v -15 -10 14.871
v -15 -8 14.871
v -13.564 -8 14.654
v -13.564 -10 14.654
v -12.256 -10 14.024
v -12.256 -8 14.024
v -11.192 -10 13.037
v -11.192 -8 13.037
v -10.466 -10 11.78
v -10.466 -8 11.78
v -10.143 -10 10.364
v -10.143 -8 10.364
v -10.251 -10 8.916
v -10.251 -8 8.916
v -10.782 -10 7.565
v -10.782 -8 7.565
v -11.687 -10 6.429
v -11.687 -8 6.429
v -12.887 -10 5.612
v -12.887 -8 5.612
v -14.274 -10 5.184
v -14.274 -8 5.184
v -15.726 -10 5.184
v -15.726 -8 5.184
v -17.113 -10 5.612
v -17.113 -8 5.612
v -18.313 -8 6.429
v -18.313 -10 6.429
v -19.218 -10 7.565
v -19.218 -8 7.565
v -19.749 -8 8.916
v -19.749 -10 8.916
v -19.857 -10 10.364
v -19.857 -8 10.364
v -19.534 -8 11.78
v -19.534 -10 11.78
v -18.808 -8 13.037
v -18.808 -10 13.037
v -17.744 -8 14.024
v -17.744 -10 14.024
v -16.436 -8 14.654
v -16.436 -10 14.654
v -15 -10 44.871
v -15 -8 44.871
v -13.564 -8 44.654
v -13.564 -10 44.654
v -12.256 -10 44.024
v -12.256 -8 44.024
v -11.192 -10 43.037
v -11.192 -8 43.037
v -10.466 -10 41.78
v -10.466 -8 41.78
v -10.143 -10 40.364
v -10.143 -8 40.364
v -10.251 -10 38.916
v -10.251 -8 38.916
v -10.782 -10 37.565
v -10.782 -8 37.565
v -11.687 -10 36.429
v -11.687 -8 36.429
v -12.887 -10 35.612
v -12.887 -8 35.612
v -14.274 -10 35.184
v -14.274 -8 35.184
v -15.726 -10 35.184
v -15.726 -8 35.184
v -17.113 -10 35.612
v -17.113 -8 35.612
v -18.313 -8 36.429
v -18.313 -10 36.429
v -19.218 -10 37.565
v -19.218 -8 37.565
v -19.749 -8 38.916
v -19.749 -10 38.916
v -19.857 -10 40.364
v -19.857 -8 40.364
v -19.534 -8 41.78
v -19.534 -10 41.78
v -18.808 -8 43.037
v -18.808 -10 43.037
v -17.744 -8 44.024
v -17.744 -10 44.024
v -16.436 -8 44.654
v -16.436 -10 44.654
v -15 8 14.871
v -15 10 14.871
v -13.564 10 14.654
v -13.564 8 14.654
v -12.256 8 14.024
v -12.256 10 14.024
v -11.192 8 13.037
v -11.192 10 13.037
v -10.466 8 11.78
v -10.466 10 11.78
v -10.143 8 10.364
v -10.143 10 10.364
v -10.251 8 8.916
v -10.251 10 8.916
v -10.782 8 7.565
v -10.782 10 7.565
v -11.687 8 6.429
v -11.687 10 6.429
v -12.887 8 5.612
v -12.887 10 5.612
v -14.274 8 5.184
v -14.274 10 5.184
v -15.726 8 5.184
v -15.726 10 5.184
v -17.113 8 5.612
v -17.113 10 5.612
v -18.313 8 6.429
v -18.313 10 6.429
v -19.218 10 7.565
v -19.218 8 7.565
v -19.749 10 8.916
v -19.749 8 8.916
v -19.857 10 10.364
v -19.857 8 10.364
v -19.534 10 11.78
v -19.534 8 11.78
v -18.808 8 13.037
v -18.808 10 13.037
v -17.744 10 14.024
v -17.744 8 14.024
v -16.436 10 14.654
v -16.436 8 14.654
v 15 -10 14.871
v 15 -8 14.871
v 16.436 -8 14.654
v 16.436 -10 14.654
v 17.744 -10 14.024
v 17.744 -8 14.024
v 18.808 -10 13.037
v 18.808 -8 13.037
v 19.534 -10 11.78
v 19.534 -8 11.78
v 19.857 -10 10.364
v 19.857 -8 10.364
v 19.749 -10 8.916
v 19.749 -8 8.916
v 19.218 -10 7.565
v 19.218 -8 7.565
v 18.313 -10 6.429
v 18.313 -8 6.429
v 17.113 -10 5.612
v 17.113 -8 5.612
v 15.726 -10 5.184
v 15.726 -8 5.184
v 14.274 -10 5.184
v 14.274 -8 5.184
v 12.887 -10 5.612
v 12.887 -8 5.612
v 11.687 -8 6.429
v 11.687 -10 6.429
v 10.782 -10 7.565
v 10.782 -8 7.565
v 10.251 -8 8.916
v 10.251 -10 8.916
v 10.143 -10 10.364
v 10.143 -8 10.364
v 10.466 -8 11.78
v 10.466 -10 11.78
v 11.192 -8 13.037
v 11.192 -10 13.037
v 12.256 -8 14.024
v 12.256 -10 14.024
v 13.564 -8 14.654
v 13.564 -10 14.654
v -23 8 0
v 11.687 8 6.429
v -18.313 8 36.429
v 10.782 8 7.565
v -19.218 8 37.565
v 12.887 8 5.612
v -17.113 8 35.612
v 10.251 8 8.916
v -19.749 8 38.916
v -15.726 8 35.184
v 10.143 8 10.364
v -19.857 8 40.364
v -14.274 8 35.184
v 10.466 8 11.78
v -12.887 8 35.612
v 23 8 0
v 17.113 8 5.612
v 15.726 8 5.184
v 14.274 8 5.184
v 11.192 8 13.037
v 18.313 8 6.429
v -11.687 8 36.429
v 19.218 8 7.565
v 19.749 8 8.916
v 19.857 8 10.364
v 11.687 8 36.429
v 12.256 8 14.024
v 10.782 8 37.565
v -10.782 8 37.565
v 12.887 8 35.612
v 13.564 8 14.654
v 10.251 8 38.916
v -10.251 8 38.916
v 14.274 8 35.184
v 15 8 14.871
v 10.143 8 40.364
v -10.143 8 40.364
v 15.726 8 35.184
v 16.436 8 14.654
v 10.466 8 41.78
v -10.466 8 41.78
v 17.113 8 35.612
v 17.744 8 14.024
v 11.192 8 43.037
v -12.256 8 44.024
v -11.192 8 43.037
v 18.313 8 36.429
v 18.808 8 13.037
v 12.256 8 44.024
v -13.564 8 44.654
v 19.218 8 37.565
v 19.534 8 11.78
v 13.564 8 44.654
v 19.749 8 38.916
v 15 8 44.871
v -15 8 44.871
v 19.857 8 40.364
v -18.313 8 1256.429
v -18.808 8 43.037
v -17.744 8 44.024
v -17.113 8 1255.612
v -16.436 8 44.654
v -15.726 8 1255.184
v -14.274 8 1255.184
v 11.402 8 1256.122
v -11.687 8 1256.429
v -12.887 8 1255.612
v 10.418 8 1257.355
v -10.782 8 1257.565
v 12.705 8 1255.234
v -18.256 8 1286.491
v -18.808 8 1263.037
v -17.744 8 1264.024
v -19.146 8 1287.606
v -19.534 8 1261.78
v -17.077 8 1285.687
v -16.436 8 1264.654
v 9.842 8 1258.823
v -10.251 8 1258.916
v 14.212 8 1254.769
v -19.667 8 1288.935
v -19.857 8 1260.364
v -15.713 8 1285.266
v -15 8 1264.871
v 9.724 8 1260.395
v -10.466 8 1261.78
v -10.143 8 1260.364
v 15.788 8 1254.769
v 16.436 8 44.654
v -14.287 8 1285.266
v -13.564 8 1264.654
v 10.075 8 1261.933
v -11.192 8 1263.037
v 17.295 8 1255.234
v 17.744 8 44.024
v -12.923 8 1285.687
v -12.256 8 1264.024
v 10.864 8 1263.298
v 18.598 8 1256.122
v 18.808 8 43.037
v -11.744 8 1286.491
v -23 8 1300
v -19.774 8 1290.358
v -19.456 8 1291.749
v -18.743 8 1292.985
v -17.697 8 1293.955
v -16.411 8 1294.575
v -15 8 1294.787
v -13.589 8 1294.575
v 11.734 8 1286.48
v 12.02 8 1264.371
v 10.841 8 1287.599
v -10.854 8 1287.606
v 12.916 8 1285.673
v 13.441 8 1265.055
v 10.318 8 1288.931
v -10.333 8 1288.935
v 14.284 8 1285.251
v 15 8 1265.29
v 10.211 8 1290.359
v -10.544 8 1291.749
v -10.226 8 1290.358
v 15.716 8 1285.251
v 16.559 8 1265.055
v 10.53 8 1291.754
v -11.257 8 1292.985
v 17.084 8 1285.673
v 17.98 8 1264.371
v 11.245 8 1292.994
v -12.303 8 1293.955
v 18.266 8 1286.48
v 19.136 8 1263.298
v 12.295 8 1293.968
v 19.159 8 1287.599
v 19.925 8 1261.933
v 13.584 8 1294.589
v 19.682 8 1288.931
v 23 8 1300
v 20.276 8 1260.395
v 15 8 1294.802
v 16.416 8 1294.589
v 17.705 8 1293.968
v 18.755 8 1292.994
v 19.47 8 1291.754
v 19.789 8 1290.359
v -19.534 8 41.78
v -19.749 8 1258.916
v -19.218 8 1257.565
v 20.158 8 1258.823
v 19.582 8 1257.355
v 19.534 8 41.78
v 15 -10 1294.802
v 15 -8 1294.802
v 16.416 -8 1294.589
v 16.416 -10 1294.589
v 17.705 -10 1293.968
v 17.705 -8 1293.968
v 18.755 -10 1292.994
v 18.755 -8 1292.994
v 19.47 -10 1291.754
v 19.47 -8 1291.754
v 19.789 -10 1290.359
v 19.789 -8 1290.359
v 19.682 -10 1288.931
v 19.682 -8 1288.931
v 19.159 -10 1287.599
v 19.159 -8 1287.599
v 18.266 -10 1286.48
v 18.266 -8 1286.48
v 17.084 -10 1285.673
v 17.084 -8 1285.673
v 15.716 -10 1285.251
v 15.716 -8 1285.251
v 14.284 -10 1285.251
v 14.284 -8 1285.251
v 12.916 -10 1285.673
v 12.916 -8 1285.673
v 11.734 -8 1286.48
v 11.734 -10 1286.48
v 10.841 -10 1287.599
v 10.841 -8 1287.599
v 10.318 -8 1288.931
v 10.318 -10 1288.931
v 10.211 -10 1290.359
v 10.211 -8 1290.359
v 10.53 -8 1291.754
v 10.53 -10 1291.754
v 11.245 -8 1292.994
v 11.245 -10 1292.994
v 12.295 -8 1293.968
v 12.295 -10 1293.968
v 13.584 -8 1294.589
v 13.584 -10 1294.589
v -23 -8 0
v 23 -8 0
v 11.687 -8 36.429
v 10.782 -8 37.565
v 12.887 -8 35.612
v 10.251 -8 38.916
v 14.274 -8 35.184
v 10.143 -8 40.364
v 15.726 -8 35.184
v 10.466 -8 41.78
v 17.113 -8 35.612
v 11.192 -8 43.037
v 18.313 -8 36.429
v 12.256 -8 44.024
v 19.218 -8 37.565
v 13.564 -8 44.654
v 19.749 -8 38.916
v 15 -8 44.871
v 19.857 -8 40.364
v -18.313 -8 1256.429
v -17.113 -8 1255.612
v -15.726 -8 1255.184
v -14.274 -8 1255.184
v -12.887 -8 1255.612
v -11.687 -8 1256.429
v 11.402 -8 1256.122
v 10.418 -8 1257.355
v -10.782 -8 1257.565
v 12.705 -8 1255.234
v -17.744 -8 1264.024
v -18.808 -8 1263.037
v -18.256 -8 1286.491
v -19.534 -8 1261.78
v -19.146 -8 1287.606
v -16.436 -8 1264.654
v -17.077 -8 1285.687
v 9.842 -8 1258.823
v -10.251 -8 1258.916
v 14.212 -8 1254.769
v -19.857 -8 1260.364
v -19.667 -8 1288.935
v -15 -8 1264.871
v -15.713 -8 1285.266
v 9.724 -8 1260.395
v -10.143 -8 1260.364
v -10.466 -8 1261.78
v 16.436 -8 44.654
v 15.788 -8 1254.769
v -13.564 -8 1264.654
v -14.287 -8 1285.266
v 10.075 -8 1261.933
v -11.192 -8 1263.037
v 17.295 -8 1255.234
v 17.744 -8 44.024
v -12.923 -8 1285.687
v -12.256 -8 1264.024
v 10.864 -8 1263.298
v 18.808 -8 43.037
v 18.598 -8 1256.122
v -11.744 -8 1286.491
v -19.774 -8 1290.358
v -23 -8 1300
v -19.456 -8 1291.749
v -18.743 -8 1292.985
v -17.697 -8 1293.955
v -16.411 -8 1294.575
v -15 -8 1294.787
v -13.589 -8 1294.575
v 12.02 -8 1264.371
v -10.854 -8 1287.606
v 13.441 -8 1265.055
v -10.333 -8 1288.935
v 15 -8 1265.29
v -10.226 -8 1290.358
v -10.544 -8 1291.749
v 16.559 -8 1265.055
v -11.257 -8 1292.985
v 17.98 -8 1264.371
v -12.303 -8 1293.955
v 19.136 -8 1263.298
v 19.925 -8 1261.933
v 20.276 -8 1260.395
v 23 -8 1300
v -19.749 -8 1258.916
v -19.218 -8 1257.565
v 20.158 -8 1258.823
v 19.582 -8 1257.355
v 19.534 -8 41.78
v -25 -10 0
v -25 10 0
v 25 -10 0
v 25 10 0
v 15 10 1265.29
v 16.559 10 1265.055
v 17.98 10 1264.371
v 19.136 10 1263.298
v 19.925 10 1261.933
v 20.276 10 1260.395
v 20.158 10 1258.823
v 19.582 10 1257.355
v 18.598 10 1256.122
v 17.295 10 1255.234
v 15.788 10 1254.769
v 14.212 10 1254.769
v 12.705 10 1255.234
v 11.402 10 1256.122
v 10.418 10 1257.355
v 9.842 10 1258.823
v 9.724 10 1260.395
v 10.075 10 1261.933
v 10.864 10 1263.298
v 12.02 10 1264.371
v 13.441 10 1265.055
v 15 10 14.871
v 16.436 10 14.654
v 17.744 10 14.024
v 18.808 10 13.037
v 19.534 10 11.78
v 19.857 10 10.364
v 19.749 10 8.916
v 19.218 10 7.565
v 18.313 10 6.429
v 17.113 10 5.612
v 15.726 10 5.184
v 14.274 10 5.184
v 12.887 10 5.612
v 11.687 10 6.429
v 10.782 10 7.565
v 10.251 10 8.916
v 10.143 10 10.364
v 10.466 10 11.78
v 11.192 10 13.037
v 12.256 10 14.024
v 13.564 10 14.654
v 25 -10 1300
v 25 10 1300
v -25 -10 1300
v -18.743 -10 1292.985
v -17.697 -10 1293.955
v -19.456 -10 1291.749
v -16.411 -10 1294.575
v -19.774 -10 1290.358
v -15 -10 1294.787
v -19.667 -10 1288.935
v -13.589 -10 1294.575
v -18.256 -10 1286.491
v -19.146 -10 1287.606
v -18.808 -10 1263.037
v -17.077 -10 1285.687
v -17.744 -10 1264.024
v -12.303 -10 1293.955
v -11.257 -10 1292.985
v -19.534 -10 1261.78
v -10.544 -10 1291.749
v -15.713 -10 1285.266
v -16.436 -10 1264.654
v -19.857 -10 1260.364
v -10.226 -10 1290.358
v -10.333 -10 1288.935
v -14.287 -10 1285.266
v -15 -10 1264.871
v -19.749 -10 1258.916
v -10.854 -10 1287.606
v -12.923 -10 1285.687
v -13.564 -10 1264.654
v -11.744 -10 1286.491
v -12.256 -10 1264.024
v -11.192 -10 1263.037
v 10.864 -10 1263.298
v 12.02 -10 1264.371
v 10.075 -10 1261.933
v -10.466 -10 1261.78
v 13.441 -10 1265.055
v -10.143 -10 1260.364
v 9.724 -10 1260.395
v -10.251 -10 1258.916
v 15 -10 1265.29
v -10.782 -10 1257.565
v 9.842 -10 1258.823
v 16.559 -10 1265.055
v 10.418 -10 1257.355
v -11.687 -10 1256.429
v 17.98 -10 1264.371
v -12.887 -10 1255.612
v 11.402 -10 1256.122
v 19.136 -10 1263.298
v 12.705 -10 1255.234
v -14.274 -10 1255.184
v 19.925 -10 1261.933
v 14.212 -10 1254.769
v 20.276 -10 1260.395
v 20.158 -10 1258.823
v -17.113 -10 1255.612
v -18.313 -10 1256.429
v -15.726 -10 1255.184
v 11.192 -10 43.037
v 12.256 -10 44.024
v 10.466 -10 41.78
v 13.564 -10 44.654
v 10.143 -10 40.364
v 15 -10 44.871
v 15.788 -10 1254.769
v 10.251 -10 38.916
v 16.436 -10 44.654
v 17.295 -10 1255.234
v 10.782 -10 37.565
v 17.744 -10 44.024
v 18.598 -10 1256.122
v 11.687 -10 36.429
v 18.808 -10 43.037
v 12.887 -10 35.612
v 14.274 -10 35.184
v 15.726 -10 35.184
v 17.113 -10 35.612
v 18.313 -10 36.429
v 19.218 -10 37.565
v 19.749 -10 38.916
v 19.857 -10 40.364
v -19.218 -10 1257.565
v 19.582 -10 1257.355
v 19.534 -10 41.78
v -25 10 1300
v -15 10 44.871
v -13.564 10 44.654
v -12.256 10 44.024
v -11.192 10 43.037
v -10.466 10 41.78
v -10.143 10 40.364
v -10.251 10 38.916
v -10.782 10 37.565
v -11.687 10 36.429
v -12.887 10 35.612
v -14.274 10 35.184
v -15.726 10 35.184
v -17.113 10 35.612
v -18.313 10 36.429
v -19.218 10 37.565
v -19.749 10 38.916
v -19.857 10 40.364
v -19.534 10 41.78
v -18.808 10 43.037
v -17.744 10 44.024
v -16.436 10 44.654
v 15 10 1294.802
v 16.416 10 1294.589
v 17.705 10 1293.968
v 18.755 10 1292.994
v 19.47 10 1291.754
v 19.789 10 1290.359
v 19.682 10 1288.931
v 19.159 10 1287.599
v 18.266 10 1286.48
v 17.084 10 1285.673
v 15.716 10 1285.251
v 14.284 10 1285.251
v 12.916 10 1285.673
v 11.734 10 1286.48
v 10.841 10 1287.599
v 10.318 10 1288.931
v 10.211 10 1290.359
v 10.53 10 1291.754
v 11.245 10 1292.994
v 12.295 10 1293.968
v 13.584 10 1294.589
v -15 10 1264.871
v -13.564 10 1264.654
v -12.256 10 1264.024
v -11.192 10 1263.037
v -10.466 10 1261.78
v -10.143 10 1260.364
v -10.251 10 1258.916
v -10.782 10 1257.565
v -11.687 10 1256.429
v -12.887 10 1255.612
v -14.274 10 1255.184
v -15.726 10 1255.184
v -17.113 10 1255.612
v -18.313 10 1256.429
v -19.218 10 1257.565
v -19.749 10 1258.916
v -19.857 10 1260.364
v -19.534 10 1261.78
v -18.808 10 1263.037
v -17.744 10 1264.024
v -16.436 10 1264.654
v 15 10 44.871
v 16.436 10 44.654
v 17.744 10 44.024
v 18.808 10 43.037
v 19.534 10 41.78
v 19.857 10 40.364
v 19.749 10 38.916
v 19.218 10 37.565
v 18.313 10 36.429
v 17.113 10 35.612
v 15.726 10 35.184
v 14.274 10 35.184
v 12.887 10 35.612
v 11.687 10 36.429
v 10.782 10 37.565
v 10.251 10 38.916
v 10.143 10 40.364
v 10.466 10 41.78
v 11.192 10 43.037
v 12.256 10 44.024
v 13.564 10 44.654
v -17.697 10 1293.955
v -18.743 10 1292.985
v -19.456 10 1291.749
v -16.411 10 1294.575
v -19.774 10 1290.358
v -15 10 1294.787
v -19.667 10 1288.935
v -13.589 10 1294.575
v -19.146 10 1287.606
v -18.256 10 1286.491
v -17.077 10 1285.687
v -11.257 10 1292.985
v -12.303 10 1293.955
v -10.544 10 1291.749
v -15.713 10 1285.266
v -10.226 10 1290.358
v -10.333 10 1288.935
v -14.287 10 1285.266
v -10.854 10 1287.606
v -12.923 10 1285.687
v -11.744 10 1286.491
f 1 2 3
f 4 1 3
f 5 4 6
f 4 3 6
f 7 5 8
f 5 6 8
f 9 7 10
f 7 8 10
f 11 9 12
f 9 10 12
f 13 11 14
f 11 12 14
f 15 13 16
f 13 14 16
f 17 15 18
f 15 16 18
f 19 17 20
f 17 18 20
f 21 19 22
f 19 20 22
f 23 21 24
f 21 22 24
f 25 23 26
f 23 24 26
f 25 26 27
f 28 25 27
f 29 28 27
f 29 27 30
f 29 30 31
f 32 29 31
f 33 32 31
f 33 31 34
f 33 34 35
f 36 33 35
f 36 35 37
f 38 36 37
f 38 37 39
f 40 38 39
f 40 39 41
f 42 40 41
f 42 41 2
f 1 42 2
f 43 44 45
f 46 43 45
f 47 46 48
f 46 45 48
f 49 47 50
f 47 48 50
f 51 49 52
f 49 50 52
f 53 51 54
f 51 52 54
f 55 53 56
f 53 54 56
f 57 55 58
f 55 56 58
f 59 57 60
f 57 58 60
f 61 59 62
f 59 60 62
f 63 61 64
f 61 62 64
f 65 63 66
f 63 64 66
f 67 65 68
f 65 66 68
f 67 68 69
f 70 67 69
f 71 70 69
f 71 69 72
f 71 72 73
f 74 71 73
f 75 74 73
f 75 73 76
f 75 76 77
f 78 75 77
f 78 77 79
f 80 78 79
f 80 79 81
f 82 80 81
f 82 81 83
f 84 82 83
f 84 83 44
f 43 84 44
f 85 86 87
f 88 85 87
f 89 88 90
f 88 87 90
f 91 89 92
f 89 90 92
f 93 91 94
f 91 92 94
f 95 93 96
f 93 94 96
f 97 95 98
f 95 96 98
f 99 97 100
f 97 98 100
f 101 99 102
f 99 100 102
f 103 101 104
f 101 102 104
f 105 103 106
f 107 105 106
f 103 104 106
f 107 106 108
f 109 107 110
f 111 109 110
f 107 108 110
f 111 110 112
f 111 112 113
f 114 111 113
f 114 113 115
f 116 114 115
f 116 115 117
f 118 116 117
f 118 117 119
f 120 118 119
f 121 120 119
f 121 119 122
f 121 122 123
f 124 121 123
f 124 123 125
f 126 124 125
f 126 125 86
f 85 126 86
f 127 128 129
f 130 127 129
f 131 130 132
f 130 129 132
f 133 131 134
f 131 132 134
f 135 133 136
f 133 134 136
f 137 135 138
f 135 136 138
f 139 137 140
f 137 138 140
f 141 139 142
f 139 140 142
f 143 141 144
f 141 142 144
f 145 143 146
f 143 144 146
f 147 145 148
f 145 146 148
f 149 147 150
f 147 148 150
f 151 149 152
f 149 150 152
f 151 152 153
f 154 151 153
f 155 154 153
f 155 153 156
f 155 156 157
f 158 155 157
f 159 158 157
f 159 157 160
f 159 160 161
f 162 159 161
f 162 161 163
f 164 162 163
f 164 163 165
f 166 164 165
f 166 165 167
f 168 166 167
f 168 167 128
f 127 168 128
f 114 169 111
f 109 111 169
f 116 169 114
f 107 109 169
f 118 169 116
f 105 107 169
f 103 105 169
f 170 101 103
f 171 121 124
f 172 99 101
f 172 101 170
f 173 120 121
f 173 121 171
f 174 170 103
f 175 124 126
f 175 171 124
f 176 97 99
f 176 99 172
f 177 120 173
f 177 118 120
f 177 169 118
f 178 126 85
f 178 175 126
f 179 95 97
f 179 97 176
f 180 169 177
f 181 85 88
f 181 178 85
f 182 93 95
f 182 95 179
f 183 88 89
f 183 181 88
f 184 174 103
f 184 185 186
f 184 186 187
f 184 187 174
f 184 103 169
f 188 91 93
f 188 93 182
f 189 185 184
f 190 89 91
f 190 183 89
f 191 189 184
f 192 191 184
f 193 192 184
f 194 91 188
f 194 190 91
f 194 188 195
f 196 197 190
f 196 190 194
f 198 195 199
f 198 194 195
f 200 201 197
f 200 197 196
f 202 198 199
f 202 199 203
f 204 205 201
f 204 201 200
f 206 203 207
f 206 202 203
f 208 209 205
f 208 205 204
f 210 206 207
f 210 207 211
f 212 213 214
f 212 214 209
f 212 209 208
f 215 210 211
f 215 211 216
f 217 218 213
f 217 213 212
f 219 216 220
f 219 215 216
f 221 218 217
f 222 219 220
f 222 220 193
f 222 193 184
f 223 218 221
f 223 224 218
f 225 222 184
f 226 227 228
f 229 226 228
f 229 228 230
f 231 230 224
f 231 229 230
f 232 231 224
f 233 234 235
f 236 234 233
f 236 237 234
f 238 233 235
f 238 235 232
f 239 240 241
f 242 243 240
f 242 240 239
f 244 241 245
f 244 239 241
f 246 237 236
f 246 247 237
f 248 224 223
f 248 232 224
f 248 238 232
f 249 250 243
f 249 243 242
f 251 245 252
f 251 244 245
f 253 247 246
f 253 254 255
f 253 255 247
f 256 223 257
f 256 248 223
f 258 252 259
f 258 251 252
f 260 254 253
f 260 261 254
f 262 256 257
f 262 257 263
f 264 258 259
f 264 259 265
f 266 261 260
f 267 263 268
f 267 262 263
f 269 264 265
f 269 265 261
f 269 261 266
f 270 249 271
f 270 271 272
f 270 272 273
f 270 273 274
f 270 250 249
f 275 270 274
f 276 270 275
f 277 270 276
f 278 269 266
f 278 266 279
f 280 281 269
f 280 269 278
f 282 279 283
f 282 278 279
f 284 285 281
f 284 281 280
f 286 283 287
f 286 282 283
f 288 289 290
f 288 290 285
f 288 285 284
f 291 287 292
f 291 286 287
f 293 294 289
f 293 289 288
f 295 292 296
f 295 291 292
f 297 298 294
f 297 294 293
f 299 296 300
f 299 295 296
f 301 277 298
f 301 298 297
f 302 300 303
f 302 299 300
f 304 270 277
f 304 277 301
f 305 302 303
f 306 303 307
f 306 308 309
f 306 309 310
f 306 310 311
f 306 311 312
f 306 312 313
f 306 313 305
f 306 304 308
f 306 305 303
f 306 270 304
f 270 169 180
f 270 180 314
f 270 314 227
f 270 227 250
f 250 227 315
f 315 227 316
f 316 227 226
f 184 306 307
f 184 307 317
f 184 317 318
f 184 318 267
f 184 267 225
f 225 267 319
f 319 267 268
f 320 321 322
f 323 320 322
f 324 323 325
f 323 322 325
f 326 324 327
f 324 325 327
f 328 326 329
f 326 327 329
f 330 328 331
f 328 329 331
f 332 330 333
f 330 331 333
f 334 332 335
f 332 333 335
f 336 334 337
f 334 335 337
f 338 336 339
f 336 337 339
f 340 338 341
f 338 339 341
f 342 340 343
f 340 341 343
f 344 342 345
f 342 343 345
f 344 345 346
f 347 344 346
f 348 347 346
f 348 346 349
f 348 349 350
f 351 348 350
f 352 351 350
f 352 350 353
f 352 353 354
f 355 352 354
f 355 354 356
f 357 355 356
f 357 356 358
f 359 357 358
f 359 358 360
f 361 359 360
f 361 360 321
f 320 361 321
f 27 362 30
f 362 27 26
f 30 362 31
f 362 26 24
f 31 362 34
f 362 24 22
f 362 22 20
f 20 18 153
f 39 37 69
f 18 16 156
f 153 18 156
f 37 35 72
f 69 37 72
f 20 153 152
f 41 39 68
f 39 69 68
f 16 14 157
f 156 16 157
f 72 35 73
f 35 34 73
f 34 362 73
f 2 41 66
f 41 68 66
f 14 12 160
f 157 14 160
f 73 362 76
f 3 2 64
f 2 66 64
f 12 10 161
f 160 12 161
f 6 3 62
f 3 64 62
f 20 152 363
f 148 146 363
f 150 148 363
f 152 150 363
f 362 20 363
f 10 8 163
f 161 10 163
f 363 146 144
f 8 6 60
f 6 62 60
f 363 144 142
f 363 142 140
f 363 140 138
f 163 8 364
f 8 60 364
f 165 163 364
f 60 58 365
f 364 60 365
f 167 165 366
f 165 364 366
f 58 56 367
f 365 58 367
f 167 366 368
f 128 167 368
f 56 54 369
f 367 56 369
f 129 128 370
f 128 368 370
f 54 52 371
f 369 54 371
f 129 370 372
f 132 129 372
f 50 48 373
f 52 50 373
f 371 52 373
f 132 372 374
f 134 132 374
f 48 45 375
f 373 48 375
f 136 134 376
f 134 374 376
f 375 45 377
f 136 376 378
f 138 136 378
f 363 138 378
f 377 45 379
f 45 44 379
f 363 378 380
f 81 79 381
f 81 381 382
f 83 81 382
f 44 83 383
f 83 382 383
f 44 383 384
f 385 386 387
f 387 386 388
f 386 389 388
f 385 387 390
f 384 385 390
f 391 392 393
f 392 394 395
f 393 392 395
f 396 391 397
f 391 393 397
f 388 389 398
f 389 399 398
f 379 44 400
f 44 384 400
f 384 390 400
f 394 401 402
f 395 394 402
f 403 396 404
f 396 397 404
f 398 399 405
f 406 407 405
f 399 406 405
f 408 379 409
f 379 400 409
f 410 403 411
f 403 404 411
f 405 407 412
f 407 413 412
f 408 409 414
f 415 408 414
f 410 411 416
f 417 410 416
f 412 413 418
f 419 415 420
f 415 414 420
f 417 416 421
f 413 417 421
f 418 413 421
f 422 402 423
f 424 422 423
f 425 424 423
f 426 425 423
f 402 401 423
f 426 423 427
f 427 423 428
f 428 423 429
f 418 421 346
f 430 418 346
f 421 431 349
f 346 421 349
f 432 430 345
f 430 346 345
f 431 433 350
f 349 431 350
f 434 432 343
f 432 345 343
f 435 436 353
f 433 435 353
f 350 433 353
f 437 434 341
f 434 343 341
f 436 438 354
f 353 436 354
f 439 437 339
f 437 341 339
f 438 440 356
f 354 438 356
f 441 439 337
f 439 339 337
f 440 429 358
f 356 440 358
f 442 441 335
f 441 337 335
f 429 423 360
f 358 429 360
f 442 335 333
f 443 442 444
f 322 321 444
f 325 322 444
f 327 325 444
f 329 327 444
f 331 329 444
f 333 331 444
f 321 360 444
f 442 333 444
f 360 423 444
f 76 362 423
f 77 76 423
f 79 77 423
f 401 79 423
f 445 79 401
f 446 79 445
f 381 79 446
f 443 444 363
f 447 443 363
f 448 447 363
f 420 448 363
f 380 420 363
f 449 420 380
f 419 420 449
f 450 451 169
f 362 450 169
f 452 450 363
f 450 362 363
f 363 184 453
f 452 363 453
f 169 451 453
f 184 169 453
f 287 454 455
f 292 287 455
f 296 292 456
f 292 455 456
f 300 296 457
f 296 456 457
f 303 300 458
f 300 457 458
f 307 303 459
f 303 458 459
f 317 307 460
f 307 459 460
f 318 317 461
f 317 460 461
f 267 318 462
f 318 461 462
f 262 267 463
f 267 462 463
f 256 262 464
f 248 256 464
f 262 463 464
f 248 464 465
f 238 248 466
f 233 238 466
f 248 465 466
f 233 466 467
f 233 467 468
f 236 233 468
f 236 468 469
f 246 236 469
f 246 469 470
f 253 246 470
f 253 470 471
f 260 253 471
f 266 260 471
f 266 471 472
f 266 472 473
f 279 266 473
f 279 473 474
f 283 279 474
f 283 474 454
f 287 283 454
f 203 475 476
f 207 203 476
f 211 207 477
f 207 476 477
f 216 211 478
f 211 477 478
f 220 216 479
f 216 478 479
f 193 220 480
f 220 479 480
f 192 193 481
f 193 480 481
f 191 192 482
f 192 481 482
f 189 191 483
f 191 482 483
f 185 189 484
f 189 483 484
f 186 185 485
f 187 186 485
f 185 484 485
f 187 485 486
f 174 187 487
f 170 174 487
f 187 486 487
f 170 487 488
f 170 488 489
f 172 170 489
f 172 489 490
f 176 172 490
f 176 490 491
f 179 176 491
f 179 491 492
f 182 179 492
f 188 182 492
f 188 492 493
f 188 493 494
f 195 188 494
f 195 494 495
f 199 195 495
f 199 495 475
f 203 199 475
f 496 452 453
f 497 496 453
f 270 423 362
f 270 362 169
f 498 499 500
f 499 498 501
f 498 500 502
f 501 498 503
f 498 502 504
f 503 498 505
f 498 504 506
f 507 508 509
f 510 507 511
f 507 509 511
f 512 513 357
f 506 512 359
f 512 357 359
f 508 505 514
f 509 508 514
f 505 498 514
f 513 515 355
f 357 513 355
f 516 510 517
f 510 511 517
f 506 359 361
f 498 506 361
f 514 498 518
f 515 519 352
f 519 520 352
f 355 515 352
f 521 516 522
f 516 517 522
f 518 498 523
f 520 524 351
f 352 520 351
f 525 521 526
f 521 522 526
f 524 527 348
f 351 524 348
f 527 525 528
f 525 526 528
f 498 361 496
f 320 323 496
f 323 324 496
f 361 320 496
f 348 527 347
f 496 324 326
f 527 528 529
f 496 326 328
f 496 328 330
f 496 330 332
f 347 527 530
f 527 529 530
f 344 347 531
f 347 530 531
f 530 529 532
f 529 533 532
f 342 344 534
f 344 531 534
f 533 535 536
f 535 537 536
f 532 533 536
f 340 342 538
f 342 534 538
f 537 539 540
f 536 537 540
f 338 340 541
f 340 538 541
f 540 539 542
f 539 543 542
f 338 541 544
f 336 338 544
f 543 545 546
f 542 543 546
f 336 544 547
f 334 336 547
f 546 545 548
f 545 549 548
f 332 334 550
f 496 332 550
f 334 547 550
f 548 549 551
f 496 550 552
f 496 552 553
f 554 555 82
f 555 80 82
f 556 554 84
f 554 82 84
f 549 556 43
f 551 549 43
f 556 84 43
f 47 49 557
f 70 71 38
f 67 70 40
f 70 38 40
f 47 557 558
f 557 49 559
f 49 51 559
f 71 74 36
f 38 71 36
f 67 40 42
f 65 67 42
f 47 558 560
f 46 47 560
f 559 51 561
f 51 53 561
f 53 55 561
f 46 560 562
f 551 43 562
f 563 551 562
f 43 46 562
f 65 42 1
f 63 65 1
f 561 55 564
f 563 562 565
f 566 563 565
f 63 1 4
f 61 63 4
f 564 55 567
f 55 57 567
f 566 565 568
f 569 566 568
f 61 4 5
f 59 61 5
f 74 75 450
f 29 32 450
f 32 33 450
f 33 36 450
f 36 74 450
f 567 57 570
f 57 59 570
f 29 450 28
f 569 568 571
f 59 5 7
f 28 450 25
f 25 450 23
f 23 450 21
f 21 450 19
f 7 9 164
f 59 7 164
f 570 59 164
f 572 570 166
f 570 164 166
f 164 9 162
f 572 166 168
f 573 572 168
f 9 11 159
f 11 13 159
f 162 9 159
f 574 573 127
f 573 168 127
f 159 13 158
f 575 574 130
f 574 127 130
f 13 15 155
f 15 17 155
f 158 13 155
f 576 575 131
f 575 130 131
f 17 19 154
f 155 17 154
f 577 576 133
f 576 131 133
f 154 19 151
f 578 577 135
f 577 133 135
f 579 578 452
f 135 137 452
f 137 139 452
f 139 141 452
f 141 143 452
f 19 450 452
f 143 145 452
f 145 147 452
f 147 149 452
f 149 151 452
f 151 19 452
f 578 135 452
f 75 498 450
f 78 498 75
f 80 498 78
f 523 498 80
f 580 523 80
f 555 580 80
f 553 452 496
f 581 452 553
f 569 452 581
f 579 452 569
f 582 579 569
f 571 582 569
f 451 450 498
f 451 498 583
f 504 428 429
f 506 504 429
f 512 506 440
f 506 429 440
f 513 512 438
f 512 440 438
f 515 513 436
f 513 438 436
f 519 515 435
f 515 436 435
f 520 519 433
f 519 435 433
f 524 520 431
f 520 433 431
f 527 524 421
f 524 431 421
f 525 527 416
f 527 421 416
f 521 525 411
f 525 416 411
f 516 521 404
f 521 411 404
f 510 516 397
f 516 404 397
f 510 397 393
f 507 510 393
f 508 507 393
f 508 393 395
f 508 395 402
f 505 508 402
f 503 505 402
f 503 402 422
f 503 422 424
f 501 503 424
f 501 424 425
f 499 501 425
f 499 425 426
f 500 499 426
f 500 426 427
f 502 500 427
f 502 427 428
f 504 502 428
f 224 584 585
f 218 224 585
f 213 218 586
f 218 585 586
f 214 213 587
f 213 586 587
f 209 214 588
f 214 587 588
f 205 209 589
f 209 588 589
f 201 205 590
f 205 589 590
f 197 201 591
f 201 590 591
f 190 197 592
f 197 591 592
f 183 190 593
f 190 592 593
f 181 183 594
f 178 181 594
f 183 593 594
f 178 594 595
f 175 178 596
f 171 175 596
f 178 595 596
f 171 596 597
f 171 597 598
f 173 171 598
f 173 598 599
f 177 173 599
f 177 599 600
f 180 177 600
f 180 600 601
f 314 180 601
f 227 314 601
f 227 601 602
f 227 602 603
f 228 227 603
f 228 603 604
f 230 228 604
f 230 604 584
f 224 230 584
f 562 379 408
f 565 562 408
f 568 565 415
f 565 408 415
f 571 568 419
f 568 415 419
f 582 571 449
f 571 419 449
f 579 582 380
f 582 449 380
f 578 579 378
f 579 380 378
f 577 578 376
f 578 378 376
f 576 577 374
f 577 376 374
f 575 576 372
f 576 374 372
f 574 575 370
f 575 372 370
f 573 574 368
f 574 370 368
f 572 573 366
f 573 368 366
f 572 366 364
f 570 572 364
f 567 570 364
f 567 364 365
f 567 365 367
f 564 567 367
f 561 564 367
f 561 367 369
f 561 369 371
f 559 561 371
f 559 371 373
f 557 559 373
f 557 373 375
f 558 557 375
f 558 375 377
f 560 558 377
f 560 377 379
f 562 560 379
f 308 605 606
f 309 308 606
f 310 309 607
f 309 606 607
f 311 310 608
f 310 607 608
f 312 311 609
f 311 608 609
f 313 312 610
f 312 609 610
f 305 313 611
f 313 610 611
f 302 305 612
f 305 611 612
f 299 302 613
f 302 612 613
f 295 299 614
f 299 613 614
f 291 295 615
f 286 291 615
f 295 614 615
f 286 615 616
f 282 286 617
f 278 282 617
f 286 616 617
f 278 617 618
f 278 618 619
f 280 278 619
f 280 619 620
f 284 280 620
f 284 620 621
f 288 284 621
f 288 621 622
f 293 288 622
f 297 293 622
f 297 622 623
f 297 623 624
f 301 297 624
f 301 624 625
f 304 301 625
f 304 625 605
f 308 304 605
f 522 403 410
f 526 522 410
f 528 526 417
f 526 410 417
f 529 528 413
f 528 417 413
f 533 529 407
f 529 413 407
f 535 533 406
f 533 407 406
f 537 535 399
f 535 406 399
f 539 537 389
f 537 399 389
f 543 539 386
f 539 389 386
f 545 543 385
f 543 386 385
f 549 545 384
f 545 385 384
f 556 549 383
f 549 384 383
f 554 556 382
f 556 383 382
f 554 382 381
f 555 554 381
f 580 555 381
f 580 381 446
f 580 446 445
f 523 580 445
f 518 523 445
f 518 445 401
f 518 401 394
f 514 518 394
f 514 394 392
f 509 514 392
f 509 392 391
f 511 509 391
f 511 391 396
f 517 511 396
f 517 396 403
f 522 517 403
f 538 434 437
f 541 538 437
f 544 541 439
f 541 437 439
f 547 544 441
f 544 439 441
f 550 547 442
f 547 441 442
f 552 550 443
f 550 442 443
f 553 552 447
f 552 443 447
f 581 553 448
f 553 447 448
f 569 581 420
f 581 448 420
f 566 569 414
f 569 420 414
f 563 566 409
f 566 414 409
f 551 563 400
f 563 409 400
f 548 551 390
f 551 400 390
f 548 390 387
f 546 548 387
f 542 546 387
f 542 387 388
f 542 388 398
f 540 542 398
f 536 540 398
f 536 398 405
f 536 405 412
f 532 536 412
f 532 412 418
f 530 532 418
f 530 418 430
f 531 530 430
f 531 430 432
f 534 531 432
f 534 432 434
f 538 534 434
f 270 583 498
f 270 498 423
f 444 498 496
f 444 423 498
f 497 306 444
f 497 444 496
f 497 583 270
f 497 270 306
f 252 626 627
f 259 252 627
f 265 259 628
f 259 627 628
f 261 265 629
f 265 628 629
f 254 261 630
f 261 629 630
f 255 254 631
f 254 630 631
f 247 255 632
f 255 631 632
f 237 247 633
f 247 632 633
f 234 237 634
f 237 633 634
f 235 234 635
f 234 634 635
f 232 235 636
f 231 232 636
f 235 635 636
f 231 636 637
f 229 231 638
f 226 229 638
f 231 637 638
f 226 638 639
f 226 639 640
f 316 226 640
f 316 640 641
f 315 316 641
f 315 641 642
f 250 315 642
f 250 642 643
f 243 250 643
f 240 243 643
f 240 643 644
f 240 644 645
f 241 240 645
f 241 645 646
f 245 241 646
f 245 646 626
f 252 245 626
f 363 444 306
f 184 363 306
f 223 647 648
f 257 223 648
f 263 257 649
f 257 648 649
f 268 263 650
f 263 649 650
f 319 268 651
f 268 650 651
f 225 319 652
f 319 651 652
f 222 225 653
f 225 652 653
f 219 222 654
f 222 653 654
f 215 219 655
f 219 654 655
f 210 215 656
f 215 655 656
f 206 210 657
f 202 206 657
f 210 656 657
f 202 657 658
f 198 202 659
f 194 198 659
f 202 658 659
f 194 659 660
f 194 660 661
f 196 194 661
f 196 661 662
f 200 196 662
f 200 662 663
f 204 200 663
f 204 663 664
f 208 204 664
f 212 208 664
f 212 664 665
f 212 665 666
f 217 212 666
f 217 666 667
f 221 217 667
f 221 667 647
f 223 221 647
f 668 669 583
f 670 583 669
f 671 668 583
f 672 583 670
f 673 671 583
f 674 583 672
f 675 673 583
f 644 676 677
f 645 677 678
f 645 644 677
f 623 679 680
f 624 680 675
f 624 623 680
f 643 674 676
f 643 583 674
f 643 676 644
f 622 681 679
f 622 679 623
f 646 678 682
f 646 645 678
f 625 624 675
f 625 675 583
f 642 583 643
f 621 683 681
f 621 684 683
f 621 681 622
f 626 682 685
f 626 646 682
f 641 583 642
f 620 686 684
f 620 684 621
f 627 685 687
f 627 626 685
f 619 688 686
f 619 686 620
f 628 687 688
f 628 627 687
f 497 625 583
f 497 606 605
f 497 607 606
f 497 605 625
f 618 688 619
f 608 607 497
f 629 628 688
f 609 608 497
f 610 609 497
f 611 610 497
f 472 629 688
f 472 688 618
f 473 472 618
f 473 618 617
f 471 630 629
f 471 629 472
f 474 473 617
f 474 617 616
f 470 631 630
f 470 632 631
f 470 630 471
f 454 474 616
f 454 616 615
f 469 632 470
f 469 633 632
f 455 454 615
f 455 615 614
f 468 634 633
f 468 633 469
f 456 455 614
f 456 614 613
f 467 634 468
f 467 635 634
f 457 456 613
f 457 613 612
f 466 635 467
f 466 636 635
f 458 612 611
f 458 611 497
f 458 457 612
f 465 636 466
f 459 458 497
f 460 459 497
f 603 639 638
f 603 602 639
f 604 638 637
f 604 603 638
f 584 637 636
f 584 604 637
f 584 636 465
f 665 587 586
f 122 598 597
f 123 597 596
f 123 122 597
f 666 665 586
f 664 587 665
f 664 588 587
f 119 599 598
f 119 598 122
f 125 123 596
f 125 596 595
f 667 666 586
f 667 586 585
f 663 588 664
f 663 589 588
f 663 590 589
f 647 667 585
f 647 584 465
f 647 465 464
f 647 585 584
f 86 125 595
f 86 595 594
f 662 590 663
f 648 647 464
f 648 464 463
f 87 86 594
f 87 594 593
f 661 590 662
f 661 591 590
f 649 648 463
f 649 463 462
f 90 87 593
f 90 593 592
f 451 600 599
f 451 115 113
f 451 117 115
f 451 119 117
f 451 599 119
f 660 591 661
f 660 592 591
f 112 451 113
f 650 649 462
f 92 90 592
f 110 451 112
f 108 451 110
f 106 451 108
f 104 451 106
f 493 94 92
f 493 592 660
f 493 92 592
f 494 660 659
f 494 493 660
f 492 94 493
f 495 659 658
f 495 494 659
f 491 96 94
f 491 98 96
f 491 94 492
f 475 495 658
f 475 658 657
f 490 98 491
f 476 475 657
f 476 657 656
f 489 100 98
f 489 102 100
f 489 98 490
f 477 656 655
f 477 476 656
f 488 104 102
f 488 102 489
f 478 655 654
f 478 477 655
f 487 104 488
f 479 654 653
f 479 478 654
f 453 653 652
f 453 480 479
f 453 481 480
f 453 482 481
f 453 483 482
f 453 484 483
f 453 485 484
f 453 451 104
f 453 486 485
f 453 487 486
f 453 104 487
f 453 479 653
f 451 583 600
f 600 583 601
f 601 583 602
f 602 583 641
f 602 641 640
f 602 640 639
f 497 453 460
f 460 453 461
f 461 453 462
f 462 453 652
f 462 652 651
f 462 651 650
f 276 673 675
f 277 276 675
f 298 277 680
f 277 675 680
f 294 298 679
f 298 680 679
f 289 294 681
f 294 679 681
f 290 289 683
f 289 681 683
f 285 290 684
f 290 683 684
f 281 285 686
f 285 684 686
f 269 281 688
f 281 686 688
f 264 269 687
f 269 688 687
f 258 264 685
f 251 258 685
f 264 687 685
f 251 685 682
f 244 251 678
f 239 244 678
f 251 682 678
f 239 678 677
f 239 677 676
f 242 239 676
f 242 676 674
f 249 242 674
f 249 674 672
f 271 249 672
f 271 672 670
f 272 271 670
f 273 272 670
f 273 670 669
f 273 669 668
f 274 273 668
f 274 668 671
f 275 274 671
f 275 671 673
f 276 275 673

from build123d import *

# Parameters (mm, degrees)
SKETCH_1_W          = 50
SKETCH_1_H          = 20
EXTRUDE_1_DEPTH     = 1300
SKETCH_2_W          = 46
SKETCH_2_H          = 16
CUT_EXTRUDE_1_DEPTH = 1301.278816254
SKETCH_3_R          = 4.80233269
SKETCH_3_R_2        = 4.787191165
SKETCH_3_R_3        = 5.290306375
SKETCH_3_R_4        = 4.870795403
CUT_EXTRUDE_2_DEPTH = 1301.394171011


with BuildPart() as part:
    # Эскиз1 → Бобышка-Вытянуть1 (new body)
    with BuildSketch(Plane.XY):
        Rectangle(SKETCH_1_W, SKETCH_1_H)
    extrude(amount=EXTRUDE_1_DEPTH)

    # Эскиз2 → Вырез-Вытянуть1 (cut, through all)
    with BuildSketch(Plane.XY.offset(1300)):
        Rectangle(SKETCH_2_W, SKETCH_2_H)
    extrude(amount=-CUT_EXTRUDE_1_DEPTH, mode=Mode.SUBTRACT)

    # Эскиз3 → Вырез-Вытянуть2 (cut, through all)
    with BuildSketch(Plane(origin=(0, 10, 0), x_dir=(1, 0, 0), z_dir=(0, 1, 0))):
        with Locations((15, -1290)):
            Circle(SKETCH_3_R)
        with Locations((-15, -1290)):
            Circle(SKETCH_3_R_2)
        with Locations((15, -1260)):
            Circle(SKETCH_3_R_3)
        with Locations((-15, -1260)):
            Circle(SKETCH_3_R_4)
        with Locations((15, -10)):
            Circle(SKETCH_3_R_4)
        with Locations((-15, -10)):
            Circle(SKETCH_3_R_4)
        with Locations((15, -40)):
            Circle(SKETCH_3_R_4)
        with Locations((-15, -40)):
            Circle(SKETCH_3_R_4)
    extrude(amount=-CUT_EXTRUDE_2_DEPTH, mode=Mode.SUBTRACT)


solid = part.part
